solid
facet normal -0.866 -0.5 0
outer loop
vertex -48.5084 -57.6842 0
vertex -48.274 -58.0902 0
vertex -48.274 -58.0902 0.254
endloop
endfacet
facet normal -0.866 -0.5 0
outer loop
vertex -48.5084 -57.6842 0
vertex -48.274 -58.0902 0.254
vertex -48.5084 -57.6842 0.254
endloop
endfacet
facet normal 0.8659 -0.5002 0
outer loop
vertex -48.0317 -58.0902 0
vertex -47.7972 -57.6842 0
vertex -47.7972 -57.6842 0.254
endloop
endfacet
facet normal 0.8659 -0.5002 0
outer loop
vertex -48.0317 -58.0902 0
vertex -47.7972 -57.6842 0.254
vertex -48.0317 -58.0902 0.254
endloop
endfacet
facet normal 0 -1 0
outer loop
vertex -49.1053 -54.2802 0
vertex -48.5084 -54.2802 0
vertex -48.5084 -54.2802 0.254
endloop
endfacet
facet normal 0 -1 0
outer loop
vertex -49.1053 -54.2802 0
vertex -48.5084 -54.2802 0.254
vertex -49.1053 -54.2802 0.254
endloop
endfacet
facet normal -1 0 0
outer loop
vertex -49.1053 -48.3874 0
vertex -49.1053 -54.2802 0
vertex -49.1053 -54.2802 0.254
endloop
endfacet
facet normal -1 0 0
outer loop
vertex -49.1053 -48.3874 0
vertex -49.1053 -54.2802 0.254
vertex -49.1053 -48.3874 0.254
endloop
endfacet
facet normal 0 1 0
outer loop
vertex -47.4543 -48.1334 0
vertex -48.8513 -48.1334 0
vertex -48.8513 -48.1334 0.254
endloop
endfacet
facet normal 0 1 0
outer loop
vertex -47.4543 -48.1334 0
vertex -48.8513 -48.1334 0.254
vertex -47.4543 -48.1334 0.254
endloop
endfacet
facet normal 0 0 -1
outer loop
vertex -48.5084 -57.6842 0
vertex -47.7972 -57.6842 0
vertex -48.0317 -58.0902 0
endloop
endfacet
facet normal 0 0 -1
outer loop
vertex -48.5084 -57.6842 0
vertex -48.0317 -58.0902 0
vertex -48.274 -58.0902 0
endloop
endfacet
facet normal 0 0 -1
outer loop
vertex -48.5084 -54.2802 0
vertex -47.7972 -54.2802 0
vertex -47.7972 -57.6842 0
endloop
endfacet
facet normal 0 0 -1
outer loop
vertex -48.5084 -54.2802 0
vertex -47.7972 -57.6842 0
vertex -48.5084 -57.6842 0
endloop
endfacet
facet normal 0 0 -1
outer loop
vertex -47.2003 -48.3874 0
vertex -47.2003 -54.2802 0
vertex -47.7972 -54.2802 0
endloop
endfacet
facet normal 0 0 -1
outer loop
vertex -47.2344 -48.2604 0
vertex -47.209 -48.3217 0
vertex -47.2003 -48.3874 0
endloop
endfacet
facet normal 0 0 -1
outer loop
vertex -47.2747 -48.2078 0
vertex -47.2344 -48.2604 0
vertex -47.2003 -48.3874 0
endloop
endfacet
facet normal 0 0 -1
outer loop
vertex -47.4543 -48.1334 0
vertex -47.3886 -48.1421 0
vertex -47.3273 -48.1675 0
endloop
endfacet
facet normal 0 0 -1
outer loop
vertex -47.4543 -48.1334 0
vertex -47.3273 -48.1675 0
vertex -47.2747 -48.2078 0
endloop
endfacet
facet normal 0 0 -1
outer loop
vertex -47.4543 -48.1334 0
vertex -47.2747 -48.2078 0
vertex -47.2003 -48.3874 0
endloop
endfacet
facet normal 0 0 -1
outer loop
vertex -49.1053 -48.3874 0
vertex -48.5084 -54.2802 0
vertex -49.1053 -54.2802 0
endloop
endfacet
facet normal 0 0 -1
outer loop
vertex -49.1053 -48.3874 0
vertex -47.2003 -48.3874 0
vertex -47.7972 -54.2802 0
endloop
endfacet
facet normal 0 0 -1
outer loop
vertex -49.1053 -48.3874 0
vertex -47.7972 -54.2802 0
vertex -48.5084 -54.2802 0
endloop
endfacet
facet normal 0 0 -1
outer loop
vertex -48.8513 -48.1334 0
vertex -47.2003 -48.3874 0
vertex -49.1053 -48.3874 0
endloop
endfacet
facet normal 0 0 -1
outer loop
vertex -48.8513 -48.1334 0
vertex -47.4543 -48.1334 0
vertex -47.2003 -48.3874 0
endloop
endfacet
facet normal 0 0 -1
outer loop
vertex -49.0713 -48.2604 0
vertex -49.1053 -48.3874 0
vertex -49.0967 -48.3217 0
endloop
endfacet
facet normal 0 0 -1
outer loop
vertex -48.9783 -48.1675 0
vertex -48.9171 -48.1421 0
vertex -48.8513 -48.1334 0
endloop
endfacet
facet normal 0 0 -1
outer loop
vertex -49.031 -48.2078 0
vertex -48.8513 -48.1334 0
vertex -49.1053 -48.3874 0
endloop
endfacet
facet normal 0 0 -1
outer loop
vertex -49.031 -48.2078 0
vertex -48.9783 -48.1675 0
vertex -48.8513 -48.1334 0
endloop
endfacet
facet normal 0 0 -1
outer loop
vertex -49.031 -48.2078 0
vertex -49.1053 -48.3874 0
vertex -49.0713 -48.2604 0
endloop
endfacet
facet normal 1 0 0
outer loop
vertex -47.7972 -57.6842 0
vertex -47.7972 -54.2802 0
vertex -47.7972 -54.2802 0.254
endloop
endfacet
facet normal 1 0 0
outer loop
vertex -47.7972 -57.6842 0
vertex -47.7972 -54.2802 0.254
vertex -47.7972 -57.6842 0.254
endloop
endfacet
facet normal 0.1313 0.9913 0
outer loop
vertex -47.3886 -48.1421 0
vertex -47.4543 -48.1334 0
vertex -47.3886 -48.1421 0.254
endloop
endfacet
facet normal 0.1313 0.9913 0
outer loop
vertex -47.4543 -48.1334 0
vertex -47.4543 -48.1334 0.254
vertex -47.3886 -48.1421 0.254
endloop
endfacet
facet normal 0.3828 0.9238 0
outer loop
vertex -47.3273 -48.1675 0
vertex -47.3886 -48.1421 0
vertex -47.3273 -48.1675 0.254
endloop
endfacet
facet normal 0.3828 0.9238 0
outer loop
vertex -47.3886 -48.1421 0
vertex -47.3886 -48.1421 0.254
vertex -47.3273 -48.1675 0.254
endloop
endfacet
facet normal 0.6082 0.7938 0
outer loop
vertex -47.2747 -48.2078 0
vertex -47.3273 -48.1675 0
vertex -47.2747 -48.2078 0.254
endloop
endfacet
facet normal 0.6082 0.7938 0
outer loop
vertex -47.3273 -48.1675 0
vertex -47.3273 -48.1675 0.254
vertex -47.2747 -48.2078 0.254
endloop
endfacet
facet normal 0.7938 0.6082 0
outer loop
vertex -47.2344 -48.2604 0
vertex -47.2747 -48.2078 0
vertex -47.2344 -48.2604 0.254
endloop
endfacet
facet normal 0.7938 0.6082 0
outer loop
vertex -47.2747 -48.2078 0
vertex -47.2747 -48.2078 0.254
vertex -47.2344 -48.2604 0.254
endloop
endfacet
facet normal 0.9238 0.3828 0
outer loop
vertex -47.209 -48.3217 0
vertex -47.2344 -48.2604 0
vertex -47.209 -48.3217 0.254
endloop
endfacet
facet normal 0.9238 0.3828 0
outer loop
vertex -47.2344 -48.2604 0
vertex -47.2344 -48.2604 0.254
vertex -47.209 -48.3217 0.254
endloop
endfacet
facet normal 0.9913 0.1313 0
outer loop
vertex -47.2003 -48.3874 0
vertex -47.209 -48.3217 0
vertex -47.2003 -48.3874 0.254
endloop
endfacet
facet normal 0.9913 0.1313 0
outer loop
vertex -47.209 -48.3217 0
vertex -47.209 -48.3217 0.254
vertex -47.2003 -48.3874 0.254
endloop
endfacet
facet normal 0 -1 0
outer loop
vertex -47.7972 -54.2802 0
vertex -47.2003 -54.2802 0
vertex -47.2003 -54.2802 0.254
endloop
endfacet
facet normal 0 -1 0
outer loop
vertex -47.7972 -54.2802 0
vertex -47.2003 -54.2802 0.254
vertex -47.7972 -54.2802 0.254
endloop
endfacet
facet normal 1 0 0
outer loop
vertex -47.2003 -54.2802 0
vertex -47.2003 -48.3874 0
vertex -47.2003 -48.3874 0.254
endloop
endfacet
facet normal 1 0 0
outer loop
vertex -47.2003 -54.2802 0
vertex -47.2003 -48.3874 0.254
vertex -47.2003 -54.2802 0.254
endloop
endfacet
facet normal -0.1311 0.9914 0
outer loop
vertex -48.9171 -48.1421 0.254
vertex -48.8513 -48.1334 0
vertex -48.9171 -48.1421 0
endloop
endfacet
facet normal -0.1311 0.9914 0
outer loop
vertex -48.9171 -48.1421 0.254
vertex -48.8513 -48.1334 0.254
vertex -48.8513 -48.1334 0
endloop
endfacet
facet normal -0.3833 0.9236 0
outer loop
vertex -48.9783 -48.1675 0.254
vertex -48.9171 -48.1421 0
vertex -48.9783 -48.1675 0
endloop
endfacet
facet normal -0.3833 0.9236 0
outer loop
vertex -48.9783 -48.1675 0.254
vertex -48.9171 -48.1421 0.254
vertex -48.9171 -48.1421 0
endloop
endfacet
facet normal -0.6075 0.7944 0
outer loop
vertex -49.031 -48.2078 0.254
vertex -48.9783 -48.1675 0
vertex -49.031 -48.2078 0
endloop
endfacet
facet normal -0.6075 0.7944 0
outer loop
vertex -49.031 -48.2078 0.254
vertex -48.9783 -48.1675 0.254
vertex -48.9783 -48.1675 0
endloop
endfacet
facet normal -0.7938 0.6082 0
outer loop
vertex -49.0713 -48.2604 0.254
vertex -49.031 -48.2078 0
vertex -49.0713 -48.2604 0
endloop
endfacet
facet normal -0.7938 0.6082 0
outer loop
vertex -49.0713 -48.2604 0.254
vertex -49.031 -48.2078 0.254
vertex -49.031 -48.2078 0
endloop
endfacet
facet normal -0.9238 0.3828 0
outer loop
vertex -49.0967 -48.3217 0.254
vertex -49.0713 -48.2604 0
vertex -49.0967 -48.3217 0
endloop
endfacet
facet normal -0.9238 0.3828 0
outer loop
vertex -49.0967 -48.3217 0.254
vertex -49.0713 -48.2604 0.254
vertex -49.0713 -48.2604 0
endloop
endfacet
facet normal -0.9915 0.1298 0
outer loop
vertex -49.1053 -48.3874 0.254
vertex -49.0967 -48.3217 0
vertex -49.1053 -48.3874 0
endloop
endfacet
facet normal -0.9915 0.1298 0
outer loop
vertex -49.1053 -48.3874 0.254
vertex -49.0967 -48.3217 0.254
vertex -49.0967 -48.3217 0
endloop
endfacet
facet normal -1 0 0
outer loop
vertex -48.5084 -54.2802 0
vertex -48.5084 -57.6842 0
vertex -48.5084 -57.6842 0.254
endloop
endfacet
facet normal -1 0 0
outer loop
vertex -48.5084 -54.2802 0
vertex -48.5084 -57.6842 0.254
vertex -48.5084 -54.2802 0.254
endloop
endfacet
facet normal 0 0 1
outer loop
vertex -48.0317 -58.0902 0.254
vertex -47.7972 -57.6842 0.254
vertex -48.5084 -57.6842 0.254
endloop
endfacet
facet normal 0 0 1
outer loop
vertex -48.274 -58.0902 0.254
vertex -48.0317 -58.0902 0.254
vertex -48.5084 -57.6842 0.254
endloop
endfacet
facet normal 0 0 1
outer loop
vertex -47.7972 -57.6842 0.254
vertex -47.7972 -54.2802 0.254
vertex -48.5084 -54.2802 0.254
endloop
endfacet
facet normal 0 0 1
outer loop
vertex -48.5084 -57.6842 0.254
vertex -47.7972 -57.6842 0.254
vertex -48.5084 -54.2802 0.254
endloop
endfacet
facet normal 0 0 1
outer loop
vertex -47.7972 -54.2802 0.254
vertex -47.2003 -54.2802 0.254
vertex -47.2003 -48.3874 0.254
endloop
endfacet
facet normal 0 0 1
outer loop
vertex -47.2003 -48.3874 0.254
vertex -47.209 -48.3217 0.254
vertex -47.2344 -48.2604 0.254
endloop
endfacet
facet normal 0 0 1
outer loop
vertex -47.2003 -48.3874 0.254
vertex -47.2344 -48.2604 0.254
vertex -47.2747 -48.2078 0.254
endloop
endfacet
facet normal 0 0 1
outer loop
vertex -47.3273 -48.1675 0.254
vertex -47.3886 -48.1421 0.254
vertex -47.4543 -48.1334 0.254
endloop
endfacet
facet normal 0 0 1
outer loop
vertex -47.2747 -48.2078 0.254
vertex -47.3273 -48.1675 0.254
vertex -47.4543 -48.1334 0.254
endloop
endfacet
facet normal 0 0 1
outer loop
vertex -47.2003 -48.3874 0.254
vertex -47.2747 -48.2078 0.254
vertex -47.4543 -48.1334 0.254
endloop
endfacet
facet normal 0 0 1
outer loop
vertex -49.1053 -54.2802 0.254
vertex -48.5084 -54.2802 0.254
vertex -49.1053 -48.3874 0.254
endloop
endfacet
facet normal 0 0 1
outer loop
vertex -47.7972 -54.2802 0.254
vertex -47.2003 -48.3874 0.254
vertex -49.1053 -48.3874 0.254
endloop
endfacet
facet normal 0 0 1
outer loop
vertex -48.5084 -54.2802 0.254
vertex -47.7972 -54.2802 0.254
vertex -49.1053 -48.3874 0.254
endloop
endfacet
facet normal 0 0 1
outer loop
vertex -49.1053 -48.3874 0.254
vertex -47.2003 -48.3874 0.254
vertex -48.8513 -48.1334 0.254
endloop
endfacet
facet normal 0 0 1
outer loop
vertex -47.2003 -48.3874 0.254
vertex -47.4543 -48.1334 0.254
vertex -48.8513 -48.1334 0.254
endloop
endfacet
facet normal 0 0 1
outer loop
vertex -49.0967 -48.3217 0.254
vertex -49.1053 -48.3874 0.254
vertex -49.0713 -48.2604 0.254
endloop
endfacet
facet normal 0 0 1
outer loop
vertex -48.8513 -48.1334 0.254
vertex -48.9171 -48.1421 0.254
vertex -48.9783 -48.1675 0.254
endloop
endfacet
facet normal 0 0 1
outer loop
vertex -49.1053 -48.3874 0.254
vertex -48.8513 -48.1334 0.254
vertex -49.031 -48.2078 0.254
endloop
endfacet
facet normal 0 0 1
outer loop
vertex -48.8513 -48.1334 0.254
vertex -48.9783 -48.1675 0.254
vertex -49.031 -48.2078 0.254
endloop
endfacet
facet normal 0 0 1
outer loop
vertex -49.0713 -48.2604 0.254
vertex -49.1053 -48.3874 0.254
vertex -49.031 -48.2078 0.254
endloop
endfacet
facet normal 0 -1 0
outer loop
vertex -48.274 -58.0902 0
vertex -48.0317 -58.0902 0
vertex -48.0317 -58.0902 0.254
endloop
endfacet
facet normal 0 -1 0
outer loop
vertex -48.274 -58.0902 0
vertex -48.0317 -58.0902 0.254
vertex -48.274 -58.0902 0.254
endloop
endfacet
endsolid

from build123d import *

# Parameters (mm, degrees)
BOSS_EXTRUDE1_DEPTH = 0.254
FILLET2_R           = 0.254


with BuildPart() as part:
    # Sketch1 → Boss-Extrude1 (new body)
    with BuildSketch(Plane.XY):
        Polygon((-49.105346889, -48.133448144), (-47.200346889, -48.133448144), (-47.200346889, -54.280248144), (-47.797246889, -54.280248144), (-47.797246889, -57.684193827), (-48.031682458, -58.090248144), (-48.27401132, -58.090248144), (-48.508446889, -57.684193827), (-48.508446889, -54.280248144), (-49.105346889, -54.280248144), align=None)
    extrude(amount=BOSS_EXTRUDE1_DEPTH)

    # Fillet2
    fillet2_edges = [part.edges().sort_by_distance(p)[0] for p in [
        (-49.105346889, -48.133448144, 0.127),
        (-47.200346889, -48.133448144, 0.127),
    ]]
    fillet(fillet2_edges, radius=FILLET2_R)


solid = part.part
